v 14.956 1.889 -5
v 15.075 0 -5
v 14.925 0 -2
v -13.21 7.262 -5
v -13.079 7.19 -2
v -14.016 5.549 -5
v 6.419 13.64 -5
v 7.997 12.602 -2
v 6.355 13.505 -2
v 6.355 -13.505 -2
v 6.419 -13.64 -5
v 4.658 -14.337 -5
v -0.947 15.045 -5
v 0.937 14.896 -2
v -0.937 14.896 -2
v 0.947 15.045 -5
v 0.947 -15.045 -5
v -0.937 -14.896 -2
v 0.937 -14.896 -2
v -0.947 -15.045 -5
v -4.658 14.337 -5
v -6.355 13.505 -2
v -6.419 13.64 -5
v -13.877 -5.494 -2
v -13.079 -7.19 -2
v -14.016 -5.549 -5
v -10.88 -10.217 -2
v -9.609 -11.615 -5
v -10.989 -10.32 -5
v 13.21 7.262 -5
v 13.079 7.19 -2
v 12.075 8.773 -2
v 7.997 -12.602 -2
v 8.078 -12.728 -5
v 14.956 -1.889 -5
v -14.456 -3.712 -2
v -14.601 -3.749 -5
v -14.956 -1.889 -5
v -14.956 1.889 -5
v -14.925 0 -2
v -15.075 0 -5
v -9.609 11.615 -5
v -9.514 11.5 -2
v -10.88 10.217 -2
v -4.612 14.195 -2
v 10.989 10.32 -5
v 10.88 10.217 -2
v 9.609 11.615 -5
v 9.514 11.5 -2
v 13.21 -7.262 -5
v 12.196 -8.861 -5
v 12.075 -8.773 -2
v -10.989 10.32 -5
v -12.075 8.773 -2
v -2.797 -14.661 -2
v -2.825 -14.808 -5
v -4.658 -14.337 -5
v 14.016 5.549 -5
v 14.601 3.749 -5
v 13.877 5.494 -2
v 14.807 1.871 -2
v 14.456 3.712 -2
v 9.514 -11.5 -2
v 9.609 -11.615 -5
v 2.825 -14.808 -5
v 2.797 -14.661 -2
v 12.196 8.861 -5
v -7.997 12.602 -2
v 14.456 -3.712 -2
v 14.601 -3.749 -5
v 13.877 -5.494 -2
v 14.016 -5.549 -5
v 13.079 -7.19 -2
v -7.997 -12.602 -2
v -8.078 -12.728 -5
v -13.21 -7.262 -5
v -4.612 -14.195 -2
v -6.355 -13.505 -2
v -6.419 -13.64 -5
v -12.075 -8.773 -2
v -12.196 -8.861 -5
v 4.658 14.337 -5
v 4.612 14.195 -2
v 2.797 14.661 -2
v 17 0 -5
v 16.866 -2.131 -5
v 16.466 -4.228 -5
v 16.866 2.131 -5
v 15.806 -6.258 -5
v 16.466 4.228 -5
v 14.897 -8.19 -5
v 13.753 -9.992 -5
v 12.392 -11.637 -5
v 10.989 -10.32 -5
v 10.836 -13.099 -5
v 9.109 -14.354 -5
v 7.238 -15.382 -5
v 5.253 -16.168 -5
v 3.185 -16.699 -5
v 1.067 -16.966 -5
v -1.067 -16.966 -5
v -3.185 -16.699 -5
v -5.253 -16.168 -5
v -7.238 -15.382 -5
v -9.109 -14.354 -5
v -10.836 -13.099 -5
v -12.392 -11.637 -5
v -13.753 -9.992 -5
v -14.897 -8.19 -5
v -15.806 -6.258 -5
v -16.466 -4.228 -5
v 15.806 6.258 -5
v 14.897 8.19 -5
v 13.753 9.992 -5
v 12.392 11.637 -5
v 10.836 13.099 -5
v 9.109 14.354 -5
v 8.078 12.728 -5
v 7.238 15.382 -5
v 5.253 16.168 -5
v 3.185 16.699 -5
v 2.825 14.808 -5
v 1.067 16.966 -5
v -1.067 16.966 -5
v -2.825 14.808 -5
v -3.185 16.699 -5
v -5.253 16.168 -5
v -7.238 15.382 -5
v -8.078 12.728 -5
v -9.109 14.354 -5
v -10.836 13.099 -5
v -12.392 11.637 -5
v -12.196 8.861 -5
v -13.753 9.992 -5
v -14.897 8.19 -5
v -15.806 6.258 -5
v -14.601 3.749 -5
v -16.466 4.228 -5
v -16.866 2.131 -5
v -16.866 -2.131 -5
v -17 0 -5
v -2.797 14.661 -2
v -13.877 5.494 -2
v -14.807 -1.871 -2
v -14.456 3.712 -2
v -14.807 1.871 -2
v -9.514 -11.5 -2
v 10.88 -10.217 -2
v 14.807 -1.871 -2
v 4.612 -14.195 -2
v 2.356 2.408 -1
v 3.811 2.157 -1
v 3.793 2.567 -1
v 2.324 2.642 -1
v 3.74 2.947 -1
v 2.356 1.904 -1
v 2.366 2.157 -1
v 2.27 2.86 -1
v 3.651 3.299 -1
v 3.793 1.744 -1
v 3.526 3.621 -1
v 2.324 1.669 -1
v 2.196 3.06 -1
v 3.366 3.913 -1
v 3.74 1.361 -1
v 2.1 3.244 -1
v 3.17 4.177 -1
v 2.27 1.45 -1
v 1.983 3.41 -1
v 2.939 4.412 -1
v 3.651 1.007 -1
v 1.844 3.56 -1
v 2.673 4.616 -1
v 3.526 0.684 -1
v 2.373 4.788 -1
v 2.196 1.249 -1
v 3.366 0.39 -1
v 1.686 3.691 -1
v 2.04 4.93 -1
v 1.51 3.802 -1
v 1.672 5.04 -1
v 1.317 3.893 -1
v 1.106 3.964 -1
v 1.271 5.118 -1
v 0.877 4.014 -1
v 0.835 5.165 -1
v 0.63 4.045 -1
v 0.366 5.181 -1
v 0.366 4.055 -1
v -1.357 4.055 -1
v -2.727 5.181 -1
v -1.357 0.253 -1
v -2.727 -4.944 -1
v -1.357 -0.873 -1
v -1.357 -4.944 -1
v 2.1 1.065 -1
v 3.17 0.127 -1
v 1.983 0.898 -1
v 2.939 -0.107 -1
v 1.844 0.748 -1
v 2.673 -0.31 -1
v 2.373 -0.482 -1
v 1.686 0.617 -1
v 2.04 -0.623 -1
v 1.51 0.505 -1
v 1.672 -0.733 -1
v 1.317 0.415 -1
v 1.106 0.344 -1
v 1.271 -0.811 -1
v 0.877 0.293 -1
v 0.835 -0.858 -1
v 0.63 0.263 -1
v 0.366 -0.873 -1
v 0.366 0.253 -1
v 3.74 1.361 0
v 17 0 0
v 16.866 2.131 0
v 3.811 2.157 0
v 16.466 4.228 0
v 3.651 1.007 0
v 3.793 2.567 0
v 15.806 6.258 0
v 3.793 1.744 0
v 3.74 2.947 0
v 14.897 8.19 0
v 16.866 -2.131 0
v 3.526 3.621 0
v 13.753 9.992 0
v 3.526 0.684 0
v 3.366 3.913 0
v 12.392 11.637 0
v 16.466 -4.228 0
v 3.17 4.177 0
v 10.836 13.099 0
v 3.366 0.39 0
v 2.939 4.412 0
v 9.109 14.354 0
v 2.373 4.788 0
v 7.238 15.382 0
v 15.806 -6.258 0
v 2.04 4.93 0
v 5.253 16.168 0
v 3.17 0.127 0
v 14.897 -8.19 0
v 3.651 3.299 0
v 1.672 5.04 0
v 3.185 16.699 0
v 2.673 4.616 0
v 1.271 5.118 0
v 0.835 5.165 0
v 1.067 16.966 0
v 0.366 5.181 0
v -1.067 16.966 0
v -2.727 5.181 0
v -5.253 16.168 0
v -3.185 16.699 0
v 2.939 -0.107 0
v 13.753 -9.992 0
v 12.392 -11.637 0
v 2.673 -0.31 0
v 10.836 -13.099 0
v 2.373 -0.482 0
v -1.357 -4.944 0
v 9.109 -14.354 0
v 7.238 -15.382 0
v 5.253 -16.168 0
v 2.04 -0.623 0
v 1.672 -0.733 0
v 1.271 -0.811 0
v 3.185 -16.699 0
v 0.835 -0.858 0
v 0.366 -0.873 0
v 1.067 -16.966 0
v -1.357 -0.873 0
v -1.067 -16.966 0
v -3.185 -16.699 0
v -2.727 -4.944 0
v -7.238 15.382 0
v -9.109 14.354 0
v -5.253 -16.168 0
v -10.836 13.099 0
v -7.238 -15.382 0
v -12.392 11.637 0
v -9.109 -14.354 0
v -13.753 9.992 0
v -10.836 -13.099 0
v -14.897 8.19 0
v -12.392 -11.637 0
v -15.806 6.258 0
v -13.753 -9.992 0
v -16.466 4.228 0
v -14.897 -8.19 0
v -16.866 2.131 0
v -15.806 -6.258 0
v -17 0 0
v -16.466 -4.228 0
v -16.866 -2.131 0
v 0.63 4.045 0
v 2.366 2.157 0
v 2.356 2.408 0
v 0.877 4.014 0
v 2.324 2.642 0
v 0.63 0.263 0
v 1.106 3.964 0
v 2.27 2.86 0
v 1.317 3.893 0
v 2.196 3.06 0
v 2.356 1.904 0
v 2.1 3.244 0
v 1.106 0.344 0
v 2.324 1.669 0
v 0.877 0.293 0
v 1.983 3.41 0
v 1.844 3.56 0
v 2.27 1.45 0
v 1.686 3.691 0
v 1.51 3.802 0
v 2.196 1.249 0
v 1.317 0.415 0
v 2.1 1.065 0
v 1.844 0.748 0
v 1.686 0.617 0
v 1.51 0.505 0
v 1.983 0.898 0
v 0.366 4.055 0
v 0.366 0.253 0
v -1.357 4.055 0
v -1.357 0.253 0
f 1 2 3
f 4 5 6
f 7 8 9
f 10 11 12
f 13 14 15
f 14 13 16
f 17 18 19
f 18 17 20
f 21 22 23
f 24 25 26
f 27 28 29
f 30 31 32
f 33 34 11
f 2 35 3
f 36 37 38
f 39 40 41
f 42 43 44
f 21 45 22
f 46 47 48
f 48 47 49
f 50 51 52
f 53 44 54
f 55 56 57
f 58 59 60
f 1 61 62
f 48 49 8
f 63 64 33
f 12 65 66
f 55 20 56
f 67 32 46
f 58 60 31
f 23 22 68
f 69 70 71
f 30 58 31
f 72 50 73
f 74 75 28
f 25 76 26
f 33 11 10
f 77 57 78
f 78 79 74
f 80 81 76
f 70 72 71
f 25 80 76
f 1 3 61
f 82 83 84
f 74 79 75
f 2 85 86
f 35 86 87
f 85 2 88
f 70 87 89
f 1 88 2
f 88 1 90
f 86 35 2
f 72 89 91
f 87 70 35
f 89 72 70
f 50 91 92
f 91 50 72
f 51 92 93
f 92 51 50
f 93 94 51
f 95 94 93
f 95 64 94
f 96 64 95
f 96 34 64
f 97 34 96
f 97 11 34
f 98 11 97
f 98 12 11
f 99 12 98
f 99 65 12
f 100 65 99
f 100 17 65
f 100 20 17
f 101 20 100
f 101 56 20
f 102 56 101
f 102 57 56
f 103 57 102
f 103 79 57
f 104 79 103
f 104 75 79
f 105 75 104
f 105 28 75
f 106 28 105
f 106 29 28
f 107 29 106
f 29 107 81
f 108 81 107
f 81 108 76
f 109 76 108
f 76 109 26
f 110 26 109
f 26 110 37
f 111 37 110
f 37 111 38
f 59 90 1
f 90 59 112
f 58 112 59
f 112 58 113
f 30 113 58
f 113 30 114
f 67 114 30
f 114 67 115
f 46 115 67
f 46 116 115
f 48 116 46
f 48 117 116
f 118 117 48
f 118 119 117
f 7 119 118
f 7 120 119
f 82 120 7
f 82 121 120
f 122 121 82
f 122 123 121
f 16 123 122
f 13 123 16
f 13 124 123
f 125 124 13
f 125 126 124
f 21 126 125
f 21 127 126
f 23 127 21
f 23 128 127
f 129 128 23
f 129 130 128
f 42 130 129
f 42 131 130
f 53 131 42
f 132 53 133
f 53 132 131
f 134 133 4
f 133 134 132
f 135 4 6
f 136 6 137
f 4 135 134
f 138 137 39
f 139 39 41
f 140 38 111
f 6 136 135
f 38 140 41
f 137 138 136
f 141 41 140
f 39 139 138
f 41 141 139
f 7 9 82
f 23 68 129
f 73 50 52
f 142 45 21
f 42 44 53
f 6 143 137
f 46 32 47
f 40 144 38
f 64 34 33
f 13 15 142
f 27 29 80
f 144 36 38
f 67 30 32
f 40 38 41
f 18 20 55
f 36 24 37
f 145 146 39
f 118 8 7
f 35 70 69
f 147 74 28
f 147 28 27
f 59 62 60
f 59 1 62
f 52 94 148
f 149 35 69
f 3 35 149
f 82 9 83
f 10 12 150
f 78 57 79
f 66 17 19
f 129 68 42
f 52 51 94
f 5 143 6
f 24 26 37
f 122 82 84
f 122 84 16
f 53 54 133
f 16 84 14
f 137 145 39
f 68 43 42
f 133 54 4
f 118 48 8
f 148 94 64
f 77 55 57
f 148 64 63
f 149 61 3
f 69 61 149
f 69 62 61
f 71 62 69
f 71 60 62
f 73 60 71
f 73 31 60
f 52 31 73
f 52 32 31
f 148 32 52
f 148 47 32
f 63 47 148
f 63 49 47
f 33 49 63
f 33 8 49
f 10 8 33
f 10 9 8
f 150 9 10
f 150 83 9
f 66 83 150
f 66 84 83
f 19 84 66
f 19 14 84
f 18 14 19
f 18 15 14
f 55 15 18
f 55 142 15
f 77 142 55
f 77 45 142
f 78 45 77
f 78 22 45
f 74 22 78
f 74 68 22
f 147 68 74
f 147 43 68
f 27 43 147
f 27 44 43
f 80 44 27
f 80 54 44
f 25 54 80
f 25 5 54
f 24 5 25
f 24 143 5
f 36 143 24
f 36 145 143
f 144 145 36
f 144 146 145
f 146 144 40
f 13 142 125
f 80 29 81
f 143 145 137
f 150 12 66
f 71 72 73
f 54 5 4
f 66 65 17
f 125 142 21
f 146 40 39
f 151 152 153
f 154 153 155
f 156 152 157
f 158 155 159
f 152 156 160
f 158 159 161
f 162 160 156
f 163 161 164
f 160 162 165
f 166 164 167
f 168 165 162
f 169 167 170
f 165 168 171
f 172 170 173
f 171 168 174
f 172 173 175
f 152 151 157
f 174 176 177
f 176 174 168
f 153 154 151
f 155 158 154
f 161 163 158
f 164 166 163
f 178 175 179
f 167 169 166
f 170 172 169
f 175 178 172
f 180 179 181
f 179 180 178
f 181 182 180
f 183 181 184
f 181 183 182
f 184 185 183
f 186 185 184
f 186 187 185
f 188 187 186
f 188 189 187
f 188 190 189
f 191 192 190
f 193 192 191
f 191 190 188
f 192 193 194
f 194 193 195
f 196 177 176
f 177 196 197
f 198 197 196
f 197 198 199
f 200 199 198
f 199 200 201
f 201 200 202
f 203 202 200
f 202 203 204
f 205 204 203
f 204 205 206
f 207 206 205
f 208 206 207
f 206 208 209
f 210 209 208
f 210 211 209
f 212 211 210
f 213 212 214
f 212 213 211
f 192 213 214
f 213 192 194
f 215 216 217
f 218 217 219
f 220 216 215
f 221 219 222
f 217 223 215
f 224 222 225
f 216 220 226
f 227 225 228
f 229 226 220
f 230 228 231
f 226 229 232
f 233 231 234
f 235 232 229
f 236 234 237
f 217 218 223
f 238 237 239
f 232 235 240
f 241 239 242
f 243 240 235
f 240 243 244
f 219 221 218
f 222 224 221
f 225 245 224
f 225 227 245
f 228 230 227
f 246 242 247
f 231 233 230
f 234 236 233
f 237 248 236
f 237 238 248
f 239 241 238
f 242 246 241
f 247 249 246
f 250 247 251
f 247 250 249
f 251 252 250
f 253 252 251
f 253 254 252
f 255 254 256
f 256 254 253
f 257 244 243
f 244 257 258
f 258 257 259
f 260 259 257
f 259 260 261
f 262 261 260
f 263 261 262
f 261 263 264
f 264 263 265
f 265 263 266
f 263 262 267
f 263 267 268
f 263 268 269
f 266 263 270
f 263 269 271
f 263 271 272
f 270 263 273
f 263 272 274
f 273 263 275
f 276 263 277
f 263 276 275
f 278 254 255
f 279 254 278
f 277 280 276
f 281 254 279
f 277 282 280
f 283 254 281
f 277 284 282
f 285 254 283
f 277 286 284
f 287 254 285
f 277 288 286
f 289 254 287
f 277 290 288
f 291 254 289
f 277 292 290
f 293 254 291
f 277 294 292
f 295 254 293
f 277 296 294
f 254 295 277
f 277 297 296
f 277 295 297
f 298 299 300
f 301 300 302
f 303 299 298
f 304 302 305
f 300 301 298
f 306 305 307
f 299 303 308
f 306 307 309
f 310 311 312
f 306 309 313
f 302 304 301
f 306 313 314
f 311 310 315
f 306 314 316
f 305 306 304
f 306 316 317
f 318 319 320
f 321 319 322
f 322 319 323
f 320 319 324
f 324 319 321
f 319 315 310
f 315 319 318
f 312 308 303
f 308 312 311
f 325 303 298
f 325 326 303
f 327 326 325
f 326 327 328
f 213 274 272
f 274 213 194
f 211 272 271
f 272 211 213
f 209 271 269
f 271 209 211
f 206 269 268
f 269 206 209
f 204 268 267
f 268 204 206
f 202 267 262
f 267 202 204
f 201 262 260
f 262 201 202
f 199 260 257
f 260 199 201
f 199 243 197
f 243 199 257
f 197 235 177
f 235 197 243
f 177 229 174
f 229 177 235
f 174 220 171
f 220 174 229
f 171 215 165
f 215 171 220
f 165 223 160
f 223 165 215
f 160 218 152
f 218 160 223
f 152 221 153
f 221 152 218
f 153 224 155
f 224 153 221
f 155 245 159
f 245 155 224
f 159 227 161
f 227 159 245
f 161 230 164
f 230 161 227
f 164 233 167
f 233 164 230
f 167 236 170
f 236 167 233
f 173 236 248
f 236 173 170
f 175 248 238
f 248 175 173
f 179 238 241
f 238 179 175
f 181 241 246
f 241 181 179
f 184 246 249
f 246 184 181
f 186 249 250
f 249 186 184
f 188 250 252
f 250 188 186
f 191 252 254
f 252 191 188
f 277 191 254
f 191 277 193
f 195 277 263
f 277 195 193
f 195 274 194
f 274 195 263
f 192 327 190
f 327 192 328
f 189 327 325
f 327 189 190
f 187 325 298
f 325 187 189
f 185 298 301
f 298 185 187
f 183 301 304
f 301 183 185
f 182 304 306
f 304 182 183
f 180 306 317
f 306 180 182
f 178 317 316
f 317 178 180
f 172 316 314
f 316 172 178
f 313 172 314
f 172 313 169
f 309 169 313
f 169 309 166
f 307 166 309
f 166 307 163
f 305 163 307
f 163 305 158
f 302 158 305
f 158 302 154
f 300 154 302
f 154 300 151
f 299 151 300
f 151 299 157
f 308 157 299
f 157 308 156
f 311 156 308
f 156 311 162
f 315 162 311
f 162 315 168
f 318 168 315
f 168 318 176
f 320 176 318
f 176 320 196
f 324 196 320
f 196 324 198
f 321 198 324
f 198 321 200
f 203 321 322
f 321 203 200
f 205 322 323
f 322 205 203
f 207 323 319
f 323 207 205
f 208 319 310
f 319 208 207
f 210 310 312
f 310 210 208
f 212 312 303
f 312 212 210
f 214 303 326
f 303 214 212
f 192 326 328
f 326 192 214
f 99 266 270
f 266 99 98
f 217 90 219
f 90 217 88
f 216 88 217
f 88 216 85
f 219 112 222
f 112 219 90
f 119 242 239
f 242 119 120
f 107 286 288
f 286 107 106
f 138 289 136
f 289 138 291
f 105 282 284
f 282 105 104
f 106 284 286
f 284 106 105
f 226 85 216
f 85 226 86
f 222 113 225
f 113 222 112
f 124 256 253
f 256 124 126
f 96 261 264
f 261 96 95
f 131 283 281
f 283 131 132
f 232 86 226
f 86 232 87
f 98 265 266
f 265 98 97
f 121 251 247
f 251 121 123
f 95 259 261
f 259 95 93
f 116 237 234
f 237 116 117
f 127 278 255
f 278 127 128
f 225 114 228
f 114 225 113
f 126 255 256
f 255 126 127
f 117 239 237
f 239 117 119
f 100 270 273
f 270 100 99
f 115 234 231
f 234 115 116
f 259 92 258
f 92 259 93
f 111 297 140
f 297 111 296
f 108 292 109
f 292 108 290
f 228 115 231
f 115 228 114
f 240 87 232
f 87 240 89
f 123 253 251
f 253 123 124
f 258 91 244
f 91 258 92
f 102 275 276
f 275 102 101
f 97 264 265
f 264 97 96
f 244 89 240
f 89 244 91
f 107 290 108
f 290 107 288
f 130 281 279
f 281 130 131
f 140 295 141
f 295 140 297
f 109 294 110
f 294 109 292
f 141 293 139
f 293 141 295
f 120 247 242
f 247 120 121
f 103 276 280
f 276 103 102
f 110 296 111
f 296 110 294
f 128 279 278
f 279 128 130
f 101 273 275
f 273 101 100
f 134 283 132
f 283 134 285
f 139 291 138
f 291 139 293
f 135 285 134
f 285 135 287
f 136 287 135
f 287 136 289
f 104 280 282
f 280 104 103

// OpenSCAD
$fn = 50;


difference() {
	union() {
		translate(v = [0, 0, -5.0000000000]) {
			cylinder(h = 5, r = 17.0000000000);
		}
	}
	union() {
		#translate(v = [0, 0, -5.0000000000]) {
			cylinder(h = 3, r1 = 15.0750000000, r2 = 14.9250000000);
		}
		translate(v = [0, 0, -1]) {
			linear_extrude(height = 1) {
				text(font = "Impact", halign = "center", size = 10, text = "P", valign = "center");
			}
		}
	}
}
